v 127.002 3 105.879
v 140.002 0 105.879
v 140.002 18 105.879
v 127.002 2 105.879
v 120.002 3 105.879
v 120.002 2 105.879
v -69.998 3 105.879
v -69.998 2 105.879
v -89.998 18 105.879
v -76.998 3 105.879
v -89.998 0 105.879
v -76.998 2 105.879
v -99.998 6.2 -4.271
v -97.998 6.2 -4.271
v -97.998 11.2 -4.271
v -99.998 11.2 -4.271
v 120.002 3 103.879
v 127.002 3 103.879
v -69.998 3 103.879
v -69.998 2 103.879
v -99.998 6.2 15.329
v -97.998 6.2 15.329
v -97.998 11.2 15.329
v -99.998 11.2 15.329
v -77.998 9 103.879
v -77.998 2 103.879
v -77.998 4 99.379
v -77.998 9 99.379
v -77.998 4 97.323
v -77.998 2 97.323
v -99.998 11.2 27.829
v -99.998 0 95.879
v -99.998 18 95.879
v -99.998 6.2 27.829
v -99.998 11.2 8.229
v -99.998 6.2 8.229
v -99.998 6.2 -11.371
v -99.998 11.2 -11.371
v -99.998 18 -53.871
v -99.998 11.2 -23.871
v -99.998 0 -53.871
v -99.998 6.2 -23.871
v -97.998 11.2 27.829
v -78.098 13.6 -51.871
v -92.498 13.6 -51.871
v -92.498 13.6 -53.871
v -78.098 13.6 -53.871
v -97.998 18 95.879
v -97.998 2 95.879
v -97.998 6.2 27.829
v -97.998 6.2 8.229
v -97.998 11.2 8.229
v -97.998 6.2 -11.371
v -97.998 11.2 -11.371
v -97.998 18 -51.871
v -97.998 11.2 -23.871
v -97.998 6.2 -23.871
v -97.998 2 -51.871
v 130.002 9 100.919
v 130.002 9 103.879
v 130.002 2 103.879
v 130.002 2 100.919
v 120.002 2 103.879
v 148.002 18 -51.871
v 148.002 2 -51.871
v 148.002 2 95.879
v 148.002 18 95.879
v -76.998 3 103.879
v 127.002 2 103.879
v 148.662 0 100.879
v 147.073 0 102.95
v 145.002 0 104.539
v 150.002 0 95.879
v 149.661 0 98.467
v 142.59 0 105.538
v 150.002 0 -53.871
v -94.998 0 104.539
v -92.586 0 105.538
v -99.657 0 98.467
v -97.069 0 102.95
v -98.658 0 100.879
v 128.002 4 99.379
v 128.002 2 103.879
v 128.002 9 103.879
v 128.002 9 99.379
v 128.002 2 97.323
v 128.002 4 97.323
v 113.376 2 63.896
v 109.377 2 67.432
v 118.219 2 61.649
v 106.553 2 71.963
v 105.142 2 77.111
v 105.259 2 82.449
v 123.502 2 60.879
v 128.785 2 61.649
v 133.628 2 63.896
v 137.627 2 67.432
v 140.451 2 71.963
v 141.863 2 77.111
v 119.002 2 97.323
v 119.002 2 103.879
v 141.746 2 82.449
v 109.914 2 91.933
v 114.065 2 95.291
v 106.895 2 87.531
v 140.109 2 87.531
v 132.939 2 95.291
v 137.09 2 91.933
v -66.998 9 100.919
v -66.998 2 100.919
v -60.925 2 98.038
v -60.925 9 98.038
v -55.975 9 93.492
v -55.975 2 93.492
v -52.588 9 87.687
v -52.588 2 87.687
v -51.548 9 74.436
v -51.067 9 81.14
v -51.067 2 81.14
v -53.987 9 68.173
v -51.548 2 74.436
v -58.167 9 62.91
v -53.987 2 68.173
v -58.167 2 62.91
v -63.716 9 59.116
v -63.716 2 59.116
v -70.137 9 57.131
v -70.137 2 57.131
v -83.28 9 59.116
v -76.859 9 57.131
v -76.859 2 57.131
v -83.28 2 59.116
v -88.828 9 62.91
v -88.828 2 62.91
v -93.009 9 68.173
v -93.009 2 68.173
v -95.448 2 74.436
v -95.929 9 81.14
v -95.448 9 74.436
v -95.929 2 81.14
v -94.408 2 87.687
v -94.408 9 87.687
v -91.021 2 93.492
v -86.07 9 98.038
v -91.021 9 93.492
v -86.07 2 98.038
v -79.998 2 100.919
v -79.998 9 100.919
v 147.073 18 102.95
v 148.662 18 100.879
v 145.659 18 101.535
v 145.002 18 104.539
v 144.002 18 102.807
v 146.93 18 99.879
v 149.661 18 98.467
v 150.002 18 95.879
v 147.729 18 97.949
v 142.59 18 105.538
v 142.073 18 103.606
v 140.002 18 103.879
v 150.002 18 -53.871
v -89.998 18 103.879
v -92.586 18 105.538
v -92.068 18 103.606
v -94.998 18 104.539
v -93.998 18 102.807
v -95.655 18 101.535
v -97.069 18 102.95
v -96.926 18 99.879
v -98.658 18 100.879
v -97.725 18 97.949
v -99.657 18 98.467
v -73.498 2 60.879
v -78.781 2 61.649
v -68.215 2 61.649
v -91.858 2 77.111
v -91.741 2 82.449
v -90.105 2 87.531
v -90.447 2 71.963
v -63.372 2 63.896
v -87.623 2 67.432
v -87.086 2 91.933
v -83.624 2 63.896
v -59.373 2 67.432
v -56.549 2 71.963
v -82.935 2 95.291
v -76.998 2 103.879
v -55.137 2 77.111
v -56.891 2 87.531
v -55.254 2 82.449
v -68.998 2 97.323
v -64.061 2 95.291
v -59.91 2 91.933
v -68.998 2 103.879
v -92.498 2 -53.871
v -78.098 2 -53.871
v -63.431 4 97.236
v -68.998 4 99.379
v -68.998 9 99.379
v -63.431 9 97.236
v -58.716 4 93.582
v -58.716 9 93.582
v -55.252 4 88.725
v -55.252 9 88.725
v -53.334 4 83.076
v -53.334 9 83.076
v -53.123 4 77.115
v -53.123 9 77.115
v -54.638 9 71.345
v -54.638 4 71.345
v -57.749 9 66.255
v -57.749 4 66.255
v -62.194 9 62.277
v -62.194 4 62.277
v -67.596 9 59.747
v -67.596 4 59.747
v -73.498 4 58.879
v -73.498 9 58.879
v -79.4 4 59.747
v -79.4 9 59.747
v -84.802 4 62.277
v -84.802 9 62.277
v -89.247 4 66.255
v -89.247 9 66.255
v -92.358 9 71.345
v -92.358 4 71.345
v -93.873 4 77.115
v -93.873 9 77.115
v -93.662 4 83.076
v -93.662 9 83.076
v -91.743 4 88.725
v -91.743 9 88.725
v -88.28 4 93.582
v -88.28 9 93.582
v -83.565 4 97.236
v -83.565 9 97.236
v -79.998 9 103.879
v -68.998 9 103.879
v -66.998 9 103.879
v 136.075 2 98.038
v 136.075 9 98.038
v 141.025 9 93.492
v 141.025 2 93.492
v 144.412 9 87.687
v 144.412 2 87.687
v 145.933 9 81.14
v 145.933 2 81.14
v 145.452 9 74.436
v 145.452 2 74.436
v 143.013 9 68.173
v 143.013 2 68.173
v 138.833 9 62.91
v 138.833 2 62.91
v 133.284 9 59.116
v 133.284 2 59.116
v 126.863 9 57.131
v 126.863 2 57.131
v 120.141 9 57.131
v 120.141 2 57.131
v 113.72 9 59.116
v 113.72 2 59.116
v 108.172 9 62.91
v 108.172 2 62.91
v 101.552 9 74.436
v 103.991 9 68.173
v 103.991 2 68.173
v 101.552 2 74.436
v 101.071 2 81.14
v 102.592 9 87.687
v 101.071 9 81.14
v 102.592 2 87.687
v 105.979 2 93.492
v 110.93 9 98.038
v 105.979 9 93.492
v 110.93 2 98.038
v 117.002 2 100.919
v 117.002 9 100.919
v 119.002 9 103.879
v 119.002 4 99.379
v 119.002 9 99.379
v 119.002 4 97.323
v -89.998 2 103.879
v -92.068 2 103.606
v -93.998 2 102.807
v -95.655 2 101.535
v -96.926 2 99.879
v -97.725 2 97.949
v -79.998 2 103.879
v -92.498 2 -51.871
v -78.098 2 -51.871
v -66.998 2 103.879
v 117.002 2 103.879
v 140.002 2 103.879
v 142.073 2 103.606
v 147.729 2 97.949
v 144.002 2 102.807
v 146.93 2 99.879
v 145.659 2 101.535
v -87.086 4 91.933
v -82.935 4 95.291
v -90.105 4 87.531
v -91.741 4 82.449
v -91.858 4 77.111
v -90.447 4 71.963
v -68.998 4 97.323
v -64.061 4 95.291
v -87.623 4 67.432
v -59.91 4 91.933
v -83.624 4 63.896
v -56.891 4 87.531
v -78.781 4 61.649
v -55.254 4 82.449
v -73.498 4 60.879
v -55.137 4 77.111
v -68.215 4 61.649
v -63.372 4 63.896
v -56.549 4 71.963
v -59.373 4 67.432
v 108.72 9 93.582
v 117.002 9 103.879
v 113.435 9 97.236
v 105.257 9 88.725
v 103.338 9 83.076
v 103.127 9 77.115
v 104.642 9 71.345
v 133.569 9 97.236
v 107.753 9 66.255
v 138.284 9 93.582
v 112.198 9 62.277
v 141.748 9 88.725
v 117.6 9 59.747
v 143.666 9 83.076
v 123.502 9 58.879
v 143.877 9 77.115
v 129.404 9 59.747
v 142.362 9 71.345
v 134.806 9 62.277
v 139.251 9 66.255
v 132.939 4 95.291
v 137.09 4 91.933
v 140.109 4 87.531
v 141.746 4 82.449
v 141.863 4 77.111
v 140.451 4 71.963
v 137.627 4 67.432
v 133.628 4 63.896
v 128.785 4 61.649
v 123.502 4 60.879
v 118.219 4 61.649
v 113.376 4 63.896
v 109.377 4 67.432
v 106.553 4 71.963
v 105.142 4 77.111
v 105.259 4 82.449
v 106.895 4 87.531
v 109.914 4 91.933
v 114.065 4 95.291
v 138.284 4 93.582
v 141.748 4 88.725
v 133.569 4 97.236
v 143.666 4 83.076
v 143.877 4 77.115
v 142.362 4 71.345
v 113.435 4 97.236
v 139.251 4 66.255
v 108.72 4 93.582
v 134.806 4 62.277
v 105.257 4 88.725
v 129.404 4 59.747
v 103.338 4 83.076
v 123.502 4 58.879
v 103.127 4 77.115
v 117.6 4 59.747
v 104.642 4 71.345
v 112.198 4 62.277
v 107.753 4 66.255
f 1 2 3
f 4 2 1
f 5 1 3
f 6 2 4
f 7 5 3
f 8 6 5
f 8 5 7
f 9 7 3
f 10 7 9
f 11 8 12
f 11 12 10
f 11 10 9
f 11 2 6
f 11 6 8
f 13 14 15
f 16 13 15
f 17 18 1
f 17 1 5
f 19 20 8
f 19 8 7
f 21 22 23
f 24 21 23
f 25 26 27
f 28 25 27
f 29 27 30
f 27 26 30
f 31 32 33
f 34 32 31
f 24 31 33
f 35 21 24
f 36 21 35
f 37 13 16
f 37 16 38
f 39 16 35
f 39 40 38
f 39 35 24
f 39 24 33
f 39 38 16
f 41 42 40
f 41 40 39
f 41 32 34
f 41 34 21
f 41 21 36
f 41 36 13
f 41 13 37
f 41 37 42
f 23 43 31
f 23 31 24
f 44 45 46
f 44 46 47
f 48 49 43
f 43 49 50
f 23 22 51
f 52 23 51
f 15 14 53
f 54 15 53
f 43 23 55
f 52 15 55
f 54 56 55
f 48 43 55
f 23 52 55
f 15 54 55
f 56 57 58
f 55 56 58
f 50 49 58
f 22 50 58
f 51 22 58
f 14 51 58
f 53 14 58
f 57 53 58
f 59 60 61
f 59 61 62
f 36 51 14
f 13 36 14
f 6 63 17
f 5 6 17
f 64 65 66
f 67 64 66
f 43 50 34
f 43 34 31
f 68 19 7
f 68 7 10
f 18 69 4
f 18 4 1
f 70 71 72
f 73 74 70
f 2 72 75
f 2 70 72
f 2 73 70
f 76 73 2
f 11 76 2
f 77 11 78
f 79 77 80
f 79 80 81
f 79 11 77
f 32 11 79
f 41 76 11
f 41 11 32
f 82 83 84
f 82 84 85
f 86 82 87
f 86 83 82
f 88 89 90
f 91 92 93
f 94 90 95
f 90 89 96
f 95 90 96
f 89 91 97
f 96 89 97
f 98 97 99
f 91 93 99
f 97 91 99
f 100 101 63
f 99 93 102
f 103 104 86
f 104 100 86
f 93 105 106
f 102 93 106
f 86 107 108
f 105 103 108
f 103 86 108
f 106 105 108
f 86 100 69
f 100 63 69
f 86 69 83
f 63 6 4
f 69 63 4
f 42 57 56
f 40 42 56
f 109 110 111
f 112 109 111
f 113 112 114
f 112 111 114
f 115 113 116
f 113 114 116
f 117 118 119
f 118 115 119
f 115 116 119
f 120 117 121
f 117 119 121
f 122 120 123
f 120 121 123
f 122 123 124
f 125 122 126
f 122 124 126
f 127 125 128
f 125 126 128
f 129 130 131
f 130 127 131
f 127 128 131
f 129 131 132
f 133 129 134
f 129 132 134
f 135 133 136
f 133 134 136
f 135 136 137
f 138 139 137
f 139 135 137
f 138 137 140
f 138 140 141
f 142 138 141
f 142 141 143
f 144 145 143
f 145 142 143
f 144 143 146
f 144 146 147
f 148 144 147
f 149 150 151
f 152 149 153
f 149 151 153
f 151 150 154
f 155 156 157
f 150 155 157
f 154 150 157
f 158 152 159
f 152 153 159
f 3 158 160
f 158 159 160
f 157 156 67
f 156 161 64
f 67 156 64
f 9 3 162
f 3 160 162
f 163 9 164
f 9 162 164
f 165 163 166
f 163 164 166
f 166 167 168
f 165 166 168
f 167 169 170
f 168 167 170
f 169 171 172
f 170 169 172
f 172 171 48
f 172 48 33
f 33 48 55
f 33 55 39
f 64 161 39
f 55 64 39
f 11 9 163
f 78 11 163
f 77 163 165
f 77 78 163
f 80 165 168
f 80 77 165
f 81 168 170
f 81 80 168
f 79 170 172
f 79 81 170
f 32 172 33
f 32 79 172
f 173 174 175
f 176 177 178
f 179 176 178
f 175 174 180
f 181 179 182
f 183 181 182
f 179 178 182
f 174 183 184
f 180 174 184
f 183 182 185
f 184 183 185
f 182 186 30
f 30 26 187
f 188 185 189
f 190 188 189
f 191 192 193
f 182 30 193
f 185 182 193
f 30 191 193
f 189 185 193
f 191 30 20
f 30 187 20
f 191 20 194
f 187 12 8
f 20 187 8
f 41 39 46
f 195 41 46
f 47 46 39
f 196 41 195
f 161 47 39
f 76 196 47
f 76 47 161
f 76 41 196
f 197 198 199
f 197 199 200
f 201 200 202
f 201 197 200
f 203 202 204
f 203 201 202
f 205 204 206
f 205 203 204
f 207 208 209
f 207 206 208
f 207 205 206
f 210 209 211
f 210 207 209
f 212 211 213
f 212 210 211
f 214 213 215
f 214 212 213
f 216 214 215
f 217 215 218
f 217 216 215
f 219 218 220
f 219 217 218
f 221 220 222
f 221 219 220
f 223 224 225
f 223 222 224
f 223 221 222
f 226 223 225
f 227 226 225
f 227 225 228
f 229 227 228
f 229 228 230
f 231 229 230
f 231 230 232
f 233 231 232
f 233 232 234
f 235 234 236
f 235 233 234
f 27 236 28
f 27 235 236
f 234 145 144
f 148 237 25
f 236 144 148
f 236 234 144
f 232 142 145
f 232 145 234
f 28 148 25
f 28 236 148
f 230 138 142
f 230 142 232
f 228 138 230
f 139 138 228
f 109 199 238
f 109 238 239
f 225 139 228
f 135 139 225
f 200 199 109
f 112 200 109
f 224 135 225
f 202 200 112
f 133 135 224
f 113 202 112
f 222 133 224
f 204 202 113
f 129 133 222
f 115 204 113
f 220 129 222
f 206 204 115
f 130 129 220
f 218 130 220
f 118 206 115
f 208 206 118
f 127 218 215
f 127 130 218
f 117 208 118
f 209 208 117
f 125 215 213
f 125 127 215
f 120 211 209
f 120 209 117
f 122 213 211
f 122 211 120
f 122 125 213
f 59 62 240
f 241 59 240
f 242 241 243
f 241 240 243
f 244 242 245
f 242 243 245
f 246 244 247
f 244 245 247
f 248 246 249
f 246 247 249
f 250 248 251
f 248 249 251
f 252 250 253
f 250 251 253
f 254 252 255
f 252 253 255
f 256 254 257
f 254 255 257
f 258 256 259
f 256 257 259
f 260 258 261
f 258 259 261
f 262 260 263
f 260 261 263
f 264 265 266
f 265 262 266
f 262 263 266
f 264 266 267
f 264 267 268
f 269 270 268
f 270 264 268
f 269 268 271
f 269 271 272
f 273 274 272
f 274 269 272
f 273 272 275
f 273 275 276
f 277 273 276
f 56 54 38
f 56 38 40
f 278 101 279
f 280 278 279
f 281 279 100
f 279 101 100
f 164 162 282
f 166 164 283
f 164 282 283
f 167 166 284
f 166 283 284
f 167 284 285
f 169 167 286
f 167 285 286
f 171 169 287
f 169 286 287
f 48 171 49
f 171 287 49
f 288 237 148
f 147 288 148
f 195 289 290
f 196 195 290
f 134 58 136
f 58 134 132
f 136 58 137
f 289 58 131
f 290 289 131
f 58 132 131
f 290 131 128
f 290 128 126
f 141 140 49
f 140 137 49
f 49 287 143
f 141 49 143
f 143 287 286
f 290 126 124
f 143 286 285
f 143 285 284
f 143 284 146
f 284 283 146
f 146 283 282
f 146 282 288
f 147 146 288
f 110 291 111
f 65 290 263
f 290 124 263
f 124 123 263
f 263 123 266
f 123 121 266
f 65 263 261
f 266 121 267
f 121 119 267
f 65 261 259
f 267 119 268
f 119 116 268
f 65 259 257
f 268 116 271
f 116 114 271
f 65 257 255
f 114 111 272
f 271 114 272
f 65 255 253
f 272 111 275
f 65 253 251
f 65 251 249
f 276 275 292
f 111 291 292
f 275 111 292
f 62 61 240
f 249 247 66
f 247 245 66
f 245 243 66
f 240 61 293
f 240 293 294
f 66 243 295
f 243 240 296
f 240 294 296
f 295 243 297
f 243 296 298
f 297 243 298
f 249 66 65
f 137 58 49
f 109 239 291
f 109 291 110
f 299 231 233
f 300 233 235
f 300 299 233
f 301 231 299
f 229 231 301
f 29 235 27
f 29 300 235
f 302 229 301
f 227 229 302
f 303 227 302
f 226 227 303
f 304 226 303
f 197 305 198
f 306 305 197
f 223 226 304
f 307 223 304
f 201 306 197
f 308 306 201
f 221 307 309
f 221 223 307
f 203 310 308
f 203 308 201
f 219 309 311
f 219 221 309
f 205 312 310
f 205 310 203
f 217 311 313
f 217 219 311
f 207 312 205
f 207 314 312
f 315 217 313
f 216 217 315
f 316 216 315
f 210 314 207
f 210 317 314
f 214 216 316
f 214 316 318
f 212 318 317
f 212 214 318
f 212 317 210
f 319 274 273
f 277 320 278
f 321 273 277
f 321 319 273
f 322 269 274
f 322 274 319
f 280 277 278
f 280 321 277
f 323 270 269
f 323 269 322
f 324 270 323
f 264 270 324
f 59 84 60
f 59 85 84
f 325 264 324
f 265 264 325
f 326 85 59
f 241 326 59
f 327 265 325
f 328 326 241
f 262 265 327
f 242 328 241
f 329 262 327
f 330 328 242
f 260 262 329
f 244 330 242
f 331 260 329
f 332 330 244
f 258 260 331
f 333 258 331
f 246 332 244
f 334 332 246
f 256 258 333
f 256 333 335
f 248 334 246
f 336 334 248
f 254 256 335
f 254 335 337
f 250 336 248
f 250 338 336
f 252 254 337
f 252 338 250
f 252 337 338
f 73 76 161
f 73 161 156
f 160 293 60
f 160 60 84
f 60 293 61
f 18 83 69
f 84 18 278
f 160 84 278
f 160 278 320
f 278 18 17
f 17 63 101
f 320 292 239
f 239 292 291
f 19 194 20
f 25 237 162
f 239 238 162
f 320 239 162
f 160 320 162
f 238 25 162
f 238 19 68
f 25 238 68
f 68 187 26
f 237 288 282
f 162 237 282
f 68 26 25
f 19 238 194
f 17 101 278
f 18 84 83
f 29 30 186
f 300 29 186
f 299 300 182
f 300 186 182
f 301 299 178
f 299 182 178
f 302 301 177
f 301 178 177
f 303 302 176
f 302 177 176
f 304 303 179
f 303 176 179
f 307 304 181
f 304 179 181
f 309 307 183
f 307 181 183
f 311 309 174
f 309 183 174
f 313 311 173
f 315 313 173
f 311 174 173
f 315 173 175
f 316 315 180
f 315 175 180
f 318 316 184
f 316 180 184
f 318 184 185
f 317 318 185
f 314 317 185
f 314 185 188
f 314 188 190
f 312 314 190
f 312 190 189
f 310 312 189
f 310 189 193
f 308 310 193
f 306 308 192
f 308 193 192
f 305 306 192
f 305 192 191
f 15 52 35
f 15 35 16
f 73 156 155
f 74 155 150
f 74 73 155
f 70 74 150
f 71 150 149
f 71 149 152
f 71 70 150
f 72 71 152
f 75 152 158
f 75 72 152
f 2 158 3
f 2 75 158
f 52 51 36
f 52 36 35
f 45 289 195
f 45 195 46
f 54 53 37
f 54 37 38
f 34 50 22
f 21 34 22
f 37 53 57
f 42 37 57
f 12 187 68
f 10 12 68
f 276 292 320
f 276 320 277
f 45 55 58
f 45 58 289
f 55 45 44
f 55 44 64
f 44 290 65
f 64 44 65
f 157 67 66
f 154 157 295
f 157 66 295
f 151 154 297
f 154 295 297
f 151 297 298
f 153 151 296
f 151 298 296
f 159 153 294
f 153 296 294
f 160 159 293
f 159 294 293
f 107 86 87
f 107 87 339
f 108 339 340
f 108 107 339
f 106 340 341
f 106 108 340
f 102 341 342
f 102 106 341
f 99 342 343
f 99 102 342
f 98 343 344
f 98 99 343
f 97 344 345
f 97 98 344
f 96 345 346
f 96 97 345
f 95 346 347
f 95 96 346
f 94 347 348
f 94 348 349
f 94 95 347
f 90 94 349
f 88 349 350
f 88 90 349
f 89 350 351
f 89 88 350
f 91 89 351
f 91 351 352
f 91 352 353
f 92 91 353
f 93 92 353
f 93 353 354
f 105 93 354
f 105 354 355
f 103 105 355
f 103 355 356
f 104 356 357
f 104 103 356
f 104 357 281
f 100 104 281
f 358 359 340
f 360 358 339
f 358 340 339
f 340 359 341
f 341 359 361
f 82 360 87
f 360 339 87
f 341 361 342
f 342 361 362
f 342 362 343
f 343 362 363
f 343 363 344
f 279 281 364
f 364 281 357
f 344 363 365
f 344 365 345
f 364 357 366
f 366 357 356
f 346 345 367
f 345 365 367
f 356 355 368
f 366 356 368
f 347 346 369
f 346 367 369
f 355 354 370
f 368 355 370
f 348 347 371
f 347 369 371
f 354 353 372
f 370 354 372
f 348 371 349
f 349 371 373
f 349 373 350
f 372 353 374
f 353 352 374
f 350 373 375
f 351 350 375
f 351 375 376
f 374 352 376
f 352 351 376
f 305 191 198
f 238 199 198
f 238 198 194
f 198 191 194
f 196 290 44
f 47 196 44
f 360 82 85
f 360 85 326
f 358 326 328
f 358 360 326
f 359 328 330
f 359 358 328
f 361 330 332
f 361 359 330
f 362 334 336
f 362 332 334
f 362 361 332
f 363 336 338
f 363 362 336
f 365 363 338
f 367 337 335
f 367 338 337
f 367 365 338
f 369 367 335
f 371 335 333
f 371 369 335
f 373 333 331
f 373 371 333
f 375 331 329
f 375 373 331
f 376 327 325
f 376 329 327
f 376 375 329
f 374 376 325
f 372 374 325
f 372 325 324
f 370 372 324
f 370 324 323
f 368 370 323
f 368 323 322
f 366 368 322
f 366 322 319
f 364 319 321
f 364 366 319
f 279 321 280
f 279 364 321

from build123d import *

# Parameters (mm, degrees)
EXTRUDE_2_DEPTH     = 18
SHELL_3_T           = -2
SKETCH_2_W          = 14.4
SKETCH_2_H          = 11.6
CUT_EXTRUDE_1_DEPTH = 10
SKETCH_3_W          = 12.5
SKETCH_3_H          = 5
CUT_EXTRUDE_2_DEPTH = 10
SKETCH_4_R          = 22.5
EXTRUDE_5_DEPTH     = 7
SHELL_START         = 2
SHELL_4_OUTLINE_R   = 20.5
SHELL_4_DEPTH       = 7
SKETCH_6_W          = 9
SKETCH_6_H          = 6.786647167
CUT_EXTRUDE_4_DEPTH = 14
SKETCH_9_W          = 2
SKETCH_9_H          = 3.464226151
SKETCH_9_H_2        = 3.181171453
SKETCH_9_H_3        = 3.477296157
EXTRUDE_6_DEPTH     = 7
EXTRUDE_8_DEPTH     = 2
SKETCH_11_W         = 7
SKETCH_11_H         = 1
CUT_EXTRUDE_5_DEPTH = 2


# Read off the part's stored shape, not the designer's step: 抽壳4
with BuildPart() as part:
    # 草图1 → 凸台-拉伸2 (new body)
    with BuildSketch(Plane(origin=(0, 0, 0), x_dir=(1, 0, 0), z_dir=(0, 1, 0))):
        with BuildLine():
            Line((-99.99792574, 53.871425224), (150.00207426, 53.871425224))
            Line((150.00207426, 53.871425224), (150.00207426, -95.878574776))
            ThreePointArc((150.00207426, -95.878574776), (147.073142072, -102.949642588), (140.00207426, -105.878574776))
            Line((140.00207426, -105.878574776), (-89.99792574, -105.878574776))
            ThreePointArc((-89.99792574, -105.878574776), (-97.068993552, -102.949642588), (-99.99792574, -95.878574776))
            Line((-99.99792574, -95.878574776), (-99.99792574, 53.871425224))
        make_face()
    extrude(amount=EXTRUDE_2_DEPTH)

    # 抽壳3
    shell_3_openings = [part.faces().sort_by_distance(p)[0] for p in [
        (25.00207426, 18, 25.920044782),
    ]]
    offset(amount=SHELL_3_T, openings=shell_3_openings, kind=Kind.INTERSECTION)

    # 草图2 → 切除-拉伸1 (cut)
    with BuildSketch(Plane.XY.offset(-51.871425224)):
        with Locations((-85.29792574, 7.8)):
            Rectangle(SKETCH_2_W, SKETCH_2_H)
    extrude(amount=-CUT_EXTRUDE_1_DEPTH, mode=Mode.SUBTRACT)

    # 草图3 → 切除-拉伸2 (cut)
    with BuildSketch(Plane(origin=(-97.99792574, 0, 0), x_dir=(0, 0, -1), z_dir=(1, 0, 0))):
        with Locations((17.621425224, 8.7)):
            Rectangle(SKETCH_3_W, SKETCH_3_H)
        with Locations((-1.978574776, 8.7)):
            Rectangle(SKETCH_3_W, SKETCH_3_H)
        with Locations((-21.578574776, 8.7)):
            Rectangle(SKETCH_3_W, SKETCH_3_H)
    extrude(amount=-CUT_EXTRUDE_2_DEPTH, mode=Mode.SUBTRACT)

    # 草图4 → 凸台-拉伸5 (add)
    with BuildSketch(Plane(origin=(0, 2, 0), x_dir=(1, 0, 0), z_dir=(0, 1, 0))):
        with Locations(Location((-73.49792574, -79.378574776, 0), (0, 0, 90))):
            Circle(SKETCH_4_R)
        with Locations(Location((123.50207426, -79.378574776, 0), (0, 0, 90))):
            Circle(SKETCH_4_R)
    extrude(amount=EXTRUDE_5_DEPTH)

    # 抽壳4 outline → 抽壳4 (cut)
    with BuildSketch(Plane(origin=(0, 0, 0), x_dir=(1, 0, 0), z_dir=(0, 1, 0)).offset(SHELL_START)):
        with Locations((123.50207426, -79.378574776)):
            Circle(SHELL_4_OUTLINE_R)
        with Locations((-73.49792574, -79.378574776)):
            Circle(SHELL_4_OUTLINE_R)
    extrude(amount=SHELL_4_DEPTH, mode=Mode.SUBTRACT)

    # 草图6 → 切除-拉伸4 (cut)
    with BuildSketch(Plane(origin=(0, 2, 0), x_dir=(1, 0, 0), z_dir=(0, 1, 0))):
        with Locations((-73.49792574, -100.485251193)):
            Rectangle(SKETCH_6_W, SKETCH_6_H)
        with Locations((123.50207426, -100.485251193)):
            Rectangle(SKETCH_6_W, SKETCH_6_H)
    extrude(amount=CUT_EXTRUDE_4_DEPTH, mode=Mode.SUBTRACT)

    # 草图9 → 凸台-拉伸6 (add)
    with BuildSketch(Plane(origin=(0, 2, 0), x_dir=(1, 0, 0), z_dir=(0, 1, 0))):
        with Locations((-78.99792574, -102.1464617)):
            Rectangle(SKETCH_9_W, SKETCH_9_H)
        with Locations((-67.99792574, -102.287989049)):
            Rectangle(SKETCH_9_W, SKETCH_9_H_2)
        with Locations((129.00207426, -102.287989049)):
            Rectangle(SKETCH_9_W, SKETCH_9_H_2)
        with Locations((118.00207426, -102.139926698)):
            Rectangle(SKETCH_9_W, SKETCH_9_H_3)
    extrude(amount=EXTRUDE_6_DEPTH)

    # 草图10 → 凸台-拉伸8 (add)
    with BuildSketch(Plane(origin=(0, 2, 0), x_dir=(1, 0, 0), z_dir=(0, 1, 0))):
        with BuildLine():
            Line((-77.99792574, -99.378574776), (-77.99792574, -97.322933221))
            ThreePointArc((-77.99792574, -97.322933221), (-73.49792574, -60.878574776), (-68.99792574, -97.322933221))
            Line((-68.99792574, -97.322933221), (-68.99792574, -99.378574776))
            ThreePointArc((-68.99792574, -99.378574776), (-73.49792574, -58.878574776), (-77.99792574, -99.378574776))
        make_face()
        with BuildLine():
            Line((119.00207426, -97.322933221), (119.00207426, -99.378574776))
            ThreePointArc((119.00207426, -99.378574776), (123.50207426, -58.878574776), (128.00207426, -99.378574776))
            Line((128.00207426, -99.378574776), (128.00207426, -97.322933221))
            ThreePointArc((128.00207426, -97.322933221), (123.50207426, -60.878574776), (119.00207426, -97.322933221))
        make_face()
    extrude(amount=EXTRUDE_8_DEPTH)

    # 草图11 → 切除-拉伸5 (cut)
    with BuildSketch(Plane(origin=(0, 0, 103.878574776), x_dir=(-1, 0, 0), z_dir=(0, 0, -1))):
        with Locations((73.49792574, 2.5)):
            Rectangle(SKETCH_11_W, SKETCH_11_H)
        with Locations((-123.50207426, 2.5)):
            Rectangle(SKETCH_11_W, SKETCH_11_H)
    extrude(amount=-CUT_EXTRUDE_5_DEPTH, mode=Mode.SUBTRACT)


solid = part.part
